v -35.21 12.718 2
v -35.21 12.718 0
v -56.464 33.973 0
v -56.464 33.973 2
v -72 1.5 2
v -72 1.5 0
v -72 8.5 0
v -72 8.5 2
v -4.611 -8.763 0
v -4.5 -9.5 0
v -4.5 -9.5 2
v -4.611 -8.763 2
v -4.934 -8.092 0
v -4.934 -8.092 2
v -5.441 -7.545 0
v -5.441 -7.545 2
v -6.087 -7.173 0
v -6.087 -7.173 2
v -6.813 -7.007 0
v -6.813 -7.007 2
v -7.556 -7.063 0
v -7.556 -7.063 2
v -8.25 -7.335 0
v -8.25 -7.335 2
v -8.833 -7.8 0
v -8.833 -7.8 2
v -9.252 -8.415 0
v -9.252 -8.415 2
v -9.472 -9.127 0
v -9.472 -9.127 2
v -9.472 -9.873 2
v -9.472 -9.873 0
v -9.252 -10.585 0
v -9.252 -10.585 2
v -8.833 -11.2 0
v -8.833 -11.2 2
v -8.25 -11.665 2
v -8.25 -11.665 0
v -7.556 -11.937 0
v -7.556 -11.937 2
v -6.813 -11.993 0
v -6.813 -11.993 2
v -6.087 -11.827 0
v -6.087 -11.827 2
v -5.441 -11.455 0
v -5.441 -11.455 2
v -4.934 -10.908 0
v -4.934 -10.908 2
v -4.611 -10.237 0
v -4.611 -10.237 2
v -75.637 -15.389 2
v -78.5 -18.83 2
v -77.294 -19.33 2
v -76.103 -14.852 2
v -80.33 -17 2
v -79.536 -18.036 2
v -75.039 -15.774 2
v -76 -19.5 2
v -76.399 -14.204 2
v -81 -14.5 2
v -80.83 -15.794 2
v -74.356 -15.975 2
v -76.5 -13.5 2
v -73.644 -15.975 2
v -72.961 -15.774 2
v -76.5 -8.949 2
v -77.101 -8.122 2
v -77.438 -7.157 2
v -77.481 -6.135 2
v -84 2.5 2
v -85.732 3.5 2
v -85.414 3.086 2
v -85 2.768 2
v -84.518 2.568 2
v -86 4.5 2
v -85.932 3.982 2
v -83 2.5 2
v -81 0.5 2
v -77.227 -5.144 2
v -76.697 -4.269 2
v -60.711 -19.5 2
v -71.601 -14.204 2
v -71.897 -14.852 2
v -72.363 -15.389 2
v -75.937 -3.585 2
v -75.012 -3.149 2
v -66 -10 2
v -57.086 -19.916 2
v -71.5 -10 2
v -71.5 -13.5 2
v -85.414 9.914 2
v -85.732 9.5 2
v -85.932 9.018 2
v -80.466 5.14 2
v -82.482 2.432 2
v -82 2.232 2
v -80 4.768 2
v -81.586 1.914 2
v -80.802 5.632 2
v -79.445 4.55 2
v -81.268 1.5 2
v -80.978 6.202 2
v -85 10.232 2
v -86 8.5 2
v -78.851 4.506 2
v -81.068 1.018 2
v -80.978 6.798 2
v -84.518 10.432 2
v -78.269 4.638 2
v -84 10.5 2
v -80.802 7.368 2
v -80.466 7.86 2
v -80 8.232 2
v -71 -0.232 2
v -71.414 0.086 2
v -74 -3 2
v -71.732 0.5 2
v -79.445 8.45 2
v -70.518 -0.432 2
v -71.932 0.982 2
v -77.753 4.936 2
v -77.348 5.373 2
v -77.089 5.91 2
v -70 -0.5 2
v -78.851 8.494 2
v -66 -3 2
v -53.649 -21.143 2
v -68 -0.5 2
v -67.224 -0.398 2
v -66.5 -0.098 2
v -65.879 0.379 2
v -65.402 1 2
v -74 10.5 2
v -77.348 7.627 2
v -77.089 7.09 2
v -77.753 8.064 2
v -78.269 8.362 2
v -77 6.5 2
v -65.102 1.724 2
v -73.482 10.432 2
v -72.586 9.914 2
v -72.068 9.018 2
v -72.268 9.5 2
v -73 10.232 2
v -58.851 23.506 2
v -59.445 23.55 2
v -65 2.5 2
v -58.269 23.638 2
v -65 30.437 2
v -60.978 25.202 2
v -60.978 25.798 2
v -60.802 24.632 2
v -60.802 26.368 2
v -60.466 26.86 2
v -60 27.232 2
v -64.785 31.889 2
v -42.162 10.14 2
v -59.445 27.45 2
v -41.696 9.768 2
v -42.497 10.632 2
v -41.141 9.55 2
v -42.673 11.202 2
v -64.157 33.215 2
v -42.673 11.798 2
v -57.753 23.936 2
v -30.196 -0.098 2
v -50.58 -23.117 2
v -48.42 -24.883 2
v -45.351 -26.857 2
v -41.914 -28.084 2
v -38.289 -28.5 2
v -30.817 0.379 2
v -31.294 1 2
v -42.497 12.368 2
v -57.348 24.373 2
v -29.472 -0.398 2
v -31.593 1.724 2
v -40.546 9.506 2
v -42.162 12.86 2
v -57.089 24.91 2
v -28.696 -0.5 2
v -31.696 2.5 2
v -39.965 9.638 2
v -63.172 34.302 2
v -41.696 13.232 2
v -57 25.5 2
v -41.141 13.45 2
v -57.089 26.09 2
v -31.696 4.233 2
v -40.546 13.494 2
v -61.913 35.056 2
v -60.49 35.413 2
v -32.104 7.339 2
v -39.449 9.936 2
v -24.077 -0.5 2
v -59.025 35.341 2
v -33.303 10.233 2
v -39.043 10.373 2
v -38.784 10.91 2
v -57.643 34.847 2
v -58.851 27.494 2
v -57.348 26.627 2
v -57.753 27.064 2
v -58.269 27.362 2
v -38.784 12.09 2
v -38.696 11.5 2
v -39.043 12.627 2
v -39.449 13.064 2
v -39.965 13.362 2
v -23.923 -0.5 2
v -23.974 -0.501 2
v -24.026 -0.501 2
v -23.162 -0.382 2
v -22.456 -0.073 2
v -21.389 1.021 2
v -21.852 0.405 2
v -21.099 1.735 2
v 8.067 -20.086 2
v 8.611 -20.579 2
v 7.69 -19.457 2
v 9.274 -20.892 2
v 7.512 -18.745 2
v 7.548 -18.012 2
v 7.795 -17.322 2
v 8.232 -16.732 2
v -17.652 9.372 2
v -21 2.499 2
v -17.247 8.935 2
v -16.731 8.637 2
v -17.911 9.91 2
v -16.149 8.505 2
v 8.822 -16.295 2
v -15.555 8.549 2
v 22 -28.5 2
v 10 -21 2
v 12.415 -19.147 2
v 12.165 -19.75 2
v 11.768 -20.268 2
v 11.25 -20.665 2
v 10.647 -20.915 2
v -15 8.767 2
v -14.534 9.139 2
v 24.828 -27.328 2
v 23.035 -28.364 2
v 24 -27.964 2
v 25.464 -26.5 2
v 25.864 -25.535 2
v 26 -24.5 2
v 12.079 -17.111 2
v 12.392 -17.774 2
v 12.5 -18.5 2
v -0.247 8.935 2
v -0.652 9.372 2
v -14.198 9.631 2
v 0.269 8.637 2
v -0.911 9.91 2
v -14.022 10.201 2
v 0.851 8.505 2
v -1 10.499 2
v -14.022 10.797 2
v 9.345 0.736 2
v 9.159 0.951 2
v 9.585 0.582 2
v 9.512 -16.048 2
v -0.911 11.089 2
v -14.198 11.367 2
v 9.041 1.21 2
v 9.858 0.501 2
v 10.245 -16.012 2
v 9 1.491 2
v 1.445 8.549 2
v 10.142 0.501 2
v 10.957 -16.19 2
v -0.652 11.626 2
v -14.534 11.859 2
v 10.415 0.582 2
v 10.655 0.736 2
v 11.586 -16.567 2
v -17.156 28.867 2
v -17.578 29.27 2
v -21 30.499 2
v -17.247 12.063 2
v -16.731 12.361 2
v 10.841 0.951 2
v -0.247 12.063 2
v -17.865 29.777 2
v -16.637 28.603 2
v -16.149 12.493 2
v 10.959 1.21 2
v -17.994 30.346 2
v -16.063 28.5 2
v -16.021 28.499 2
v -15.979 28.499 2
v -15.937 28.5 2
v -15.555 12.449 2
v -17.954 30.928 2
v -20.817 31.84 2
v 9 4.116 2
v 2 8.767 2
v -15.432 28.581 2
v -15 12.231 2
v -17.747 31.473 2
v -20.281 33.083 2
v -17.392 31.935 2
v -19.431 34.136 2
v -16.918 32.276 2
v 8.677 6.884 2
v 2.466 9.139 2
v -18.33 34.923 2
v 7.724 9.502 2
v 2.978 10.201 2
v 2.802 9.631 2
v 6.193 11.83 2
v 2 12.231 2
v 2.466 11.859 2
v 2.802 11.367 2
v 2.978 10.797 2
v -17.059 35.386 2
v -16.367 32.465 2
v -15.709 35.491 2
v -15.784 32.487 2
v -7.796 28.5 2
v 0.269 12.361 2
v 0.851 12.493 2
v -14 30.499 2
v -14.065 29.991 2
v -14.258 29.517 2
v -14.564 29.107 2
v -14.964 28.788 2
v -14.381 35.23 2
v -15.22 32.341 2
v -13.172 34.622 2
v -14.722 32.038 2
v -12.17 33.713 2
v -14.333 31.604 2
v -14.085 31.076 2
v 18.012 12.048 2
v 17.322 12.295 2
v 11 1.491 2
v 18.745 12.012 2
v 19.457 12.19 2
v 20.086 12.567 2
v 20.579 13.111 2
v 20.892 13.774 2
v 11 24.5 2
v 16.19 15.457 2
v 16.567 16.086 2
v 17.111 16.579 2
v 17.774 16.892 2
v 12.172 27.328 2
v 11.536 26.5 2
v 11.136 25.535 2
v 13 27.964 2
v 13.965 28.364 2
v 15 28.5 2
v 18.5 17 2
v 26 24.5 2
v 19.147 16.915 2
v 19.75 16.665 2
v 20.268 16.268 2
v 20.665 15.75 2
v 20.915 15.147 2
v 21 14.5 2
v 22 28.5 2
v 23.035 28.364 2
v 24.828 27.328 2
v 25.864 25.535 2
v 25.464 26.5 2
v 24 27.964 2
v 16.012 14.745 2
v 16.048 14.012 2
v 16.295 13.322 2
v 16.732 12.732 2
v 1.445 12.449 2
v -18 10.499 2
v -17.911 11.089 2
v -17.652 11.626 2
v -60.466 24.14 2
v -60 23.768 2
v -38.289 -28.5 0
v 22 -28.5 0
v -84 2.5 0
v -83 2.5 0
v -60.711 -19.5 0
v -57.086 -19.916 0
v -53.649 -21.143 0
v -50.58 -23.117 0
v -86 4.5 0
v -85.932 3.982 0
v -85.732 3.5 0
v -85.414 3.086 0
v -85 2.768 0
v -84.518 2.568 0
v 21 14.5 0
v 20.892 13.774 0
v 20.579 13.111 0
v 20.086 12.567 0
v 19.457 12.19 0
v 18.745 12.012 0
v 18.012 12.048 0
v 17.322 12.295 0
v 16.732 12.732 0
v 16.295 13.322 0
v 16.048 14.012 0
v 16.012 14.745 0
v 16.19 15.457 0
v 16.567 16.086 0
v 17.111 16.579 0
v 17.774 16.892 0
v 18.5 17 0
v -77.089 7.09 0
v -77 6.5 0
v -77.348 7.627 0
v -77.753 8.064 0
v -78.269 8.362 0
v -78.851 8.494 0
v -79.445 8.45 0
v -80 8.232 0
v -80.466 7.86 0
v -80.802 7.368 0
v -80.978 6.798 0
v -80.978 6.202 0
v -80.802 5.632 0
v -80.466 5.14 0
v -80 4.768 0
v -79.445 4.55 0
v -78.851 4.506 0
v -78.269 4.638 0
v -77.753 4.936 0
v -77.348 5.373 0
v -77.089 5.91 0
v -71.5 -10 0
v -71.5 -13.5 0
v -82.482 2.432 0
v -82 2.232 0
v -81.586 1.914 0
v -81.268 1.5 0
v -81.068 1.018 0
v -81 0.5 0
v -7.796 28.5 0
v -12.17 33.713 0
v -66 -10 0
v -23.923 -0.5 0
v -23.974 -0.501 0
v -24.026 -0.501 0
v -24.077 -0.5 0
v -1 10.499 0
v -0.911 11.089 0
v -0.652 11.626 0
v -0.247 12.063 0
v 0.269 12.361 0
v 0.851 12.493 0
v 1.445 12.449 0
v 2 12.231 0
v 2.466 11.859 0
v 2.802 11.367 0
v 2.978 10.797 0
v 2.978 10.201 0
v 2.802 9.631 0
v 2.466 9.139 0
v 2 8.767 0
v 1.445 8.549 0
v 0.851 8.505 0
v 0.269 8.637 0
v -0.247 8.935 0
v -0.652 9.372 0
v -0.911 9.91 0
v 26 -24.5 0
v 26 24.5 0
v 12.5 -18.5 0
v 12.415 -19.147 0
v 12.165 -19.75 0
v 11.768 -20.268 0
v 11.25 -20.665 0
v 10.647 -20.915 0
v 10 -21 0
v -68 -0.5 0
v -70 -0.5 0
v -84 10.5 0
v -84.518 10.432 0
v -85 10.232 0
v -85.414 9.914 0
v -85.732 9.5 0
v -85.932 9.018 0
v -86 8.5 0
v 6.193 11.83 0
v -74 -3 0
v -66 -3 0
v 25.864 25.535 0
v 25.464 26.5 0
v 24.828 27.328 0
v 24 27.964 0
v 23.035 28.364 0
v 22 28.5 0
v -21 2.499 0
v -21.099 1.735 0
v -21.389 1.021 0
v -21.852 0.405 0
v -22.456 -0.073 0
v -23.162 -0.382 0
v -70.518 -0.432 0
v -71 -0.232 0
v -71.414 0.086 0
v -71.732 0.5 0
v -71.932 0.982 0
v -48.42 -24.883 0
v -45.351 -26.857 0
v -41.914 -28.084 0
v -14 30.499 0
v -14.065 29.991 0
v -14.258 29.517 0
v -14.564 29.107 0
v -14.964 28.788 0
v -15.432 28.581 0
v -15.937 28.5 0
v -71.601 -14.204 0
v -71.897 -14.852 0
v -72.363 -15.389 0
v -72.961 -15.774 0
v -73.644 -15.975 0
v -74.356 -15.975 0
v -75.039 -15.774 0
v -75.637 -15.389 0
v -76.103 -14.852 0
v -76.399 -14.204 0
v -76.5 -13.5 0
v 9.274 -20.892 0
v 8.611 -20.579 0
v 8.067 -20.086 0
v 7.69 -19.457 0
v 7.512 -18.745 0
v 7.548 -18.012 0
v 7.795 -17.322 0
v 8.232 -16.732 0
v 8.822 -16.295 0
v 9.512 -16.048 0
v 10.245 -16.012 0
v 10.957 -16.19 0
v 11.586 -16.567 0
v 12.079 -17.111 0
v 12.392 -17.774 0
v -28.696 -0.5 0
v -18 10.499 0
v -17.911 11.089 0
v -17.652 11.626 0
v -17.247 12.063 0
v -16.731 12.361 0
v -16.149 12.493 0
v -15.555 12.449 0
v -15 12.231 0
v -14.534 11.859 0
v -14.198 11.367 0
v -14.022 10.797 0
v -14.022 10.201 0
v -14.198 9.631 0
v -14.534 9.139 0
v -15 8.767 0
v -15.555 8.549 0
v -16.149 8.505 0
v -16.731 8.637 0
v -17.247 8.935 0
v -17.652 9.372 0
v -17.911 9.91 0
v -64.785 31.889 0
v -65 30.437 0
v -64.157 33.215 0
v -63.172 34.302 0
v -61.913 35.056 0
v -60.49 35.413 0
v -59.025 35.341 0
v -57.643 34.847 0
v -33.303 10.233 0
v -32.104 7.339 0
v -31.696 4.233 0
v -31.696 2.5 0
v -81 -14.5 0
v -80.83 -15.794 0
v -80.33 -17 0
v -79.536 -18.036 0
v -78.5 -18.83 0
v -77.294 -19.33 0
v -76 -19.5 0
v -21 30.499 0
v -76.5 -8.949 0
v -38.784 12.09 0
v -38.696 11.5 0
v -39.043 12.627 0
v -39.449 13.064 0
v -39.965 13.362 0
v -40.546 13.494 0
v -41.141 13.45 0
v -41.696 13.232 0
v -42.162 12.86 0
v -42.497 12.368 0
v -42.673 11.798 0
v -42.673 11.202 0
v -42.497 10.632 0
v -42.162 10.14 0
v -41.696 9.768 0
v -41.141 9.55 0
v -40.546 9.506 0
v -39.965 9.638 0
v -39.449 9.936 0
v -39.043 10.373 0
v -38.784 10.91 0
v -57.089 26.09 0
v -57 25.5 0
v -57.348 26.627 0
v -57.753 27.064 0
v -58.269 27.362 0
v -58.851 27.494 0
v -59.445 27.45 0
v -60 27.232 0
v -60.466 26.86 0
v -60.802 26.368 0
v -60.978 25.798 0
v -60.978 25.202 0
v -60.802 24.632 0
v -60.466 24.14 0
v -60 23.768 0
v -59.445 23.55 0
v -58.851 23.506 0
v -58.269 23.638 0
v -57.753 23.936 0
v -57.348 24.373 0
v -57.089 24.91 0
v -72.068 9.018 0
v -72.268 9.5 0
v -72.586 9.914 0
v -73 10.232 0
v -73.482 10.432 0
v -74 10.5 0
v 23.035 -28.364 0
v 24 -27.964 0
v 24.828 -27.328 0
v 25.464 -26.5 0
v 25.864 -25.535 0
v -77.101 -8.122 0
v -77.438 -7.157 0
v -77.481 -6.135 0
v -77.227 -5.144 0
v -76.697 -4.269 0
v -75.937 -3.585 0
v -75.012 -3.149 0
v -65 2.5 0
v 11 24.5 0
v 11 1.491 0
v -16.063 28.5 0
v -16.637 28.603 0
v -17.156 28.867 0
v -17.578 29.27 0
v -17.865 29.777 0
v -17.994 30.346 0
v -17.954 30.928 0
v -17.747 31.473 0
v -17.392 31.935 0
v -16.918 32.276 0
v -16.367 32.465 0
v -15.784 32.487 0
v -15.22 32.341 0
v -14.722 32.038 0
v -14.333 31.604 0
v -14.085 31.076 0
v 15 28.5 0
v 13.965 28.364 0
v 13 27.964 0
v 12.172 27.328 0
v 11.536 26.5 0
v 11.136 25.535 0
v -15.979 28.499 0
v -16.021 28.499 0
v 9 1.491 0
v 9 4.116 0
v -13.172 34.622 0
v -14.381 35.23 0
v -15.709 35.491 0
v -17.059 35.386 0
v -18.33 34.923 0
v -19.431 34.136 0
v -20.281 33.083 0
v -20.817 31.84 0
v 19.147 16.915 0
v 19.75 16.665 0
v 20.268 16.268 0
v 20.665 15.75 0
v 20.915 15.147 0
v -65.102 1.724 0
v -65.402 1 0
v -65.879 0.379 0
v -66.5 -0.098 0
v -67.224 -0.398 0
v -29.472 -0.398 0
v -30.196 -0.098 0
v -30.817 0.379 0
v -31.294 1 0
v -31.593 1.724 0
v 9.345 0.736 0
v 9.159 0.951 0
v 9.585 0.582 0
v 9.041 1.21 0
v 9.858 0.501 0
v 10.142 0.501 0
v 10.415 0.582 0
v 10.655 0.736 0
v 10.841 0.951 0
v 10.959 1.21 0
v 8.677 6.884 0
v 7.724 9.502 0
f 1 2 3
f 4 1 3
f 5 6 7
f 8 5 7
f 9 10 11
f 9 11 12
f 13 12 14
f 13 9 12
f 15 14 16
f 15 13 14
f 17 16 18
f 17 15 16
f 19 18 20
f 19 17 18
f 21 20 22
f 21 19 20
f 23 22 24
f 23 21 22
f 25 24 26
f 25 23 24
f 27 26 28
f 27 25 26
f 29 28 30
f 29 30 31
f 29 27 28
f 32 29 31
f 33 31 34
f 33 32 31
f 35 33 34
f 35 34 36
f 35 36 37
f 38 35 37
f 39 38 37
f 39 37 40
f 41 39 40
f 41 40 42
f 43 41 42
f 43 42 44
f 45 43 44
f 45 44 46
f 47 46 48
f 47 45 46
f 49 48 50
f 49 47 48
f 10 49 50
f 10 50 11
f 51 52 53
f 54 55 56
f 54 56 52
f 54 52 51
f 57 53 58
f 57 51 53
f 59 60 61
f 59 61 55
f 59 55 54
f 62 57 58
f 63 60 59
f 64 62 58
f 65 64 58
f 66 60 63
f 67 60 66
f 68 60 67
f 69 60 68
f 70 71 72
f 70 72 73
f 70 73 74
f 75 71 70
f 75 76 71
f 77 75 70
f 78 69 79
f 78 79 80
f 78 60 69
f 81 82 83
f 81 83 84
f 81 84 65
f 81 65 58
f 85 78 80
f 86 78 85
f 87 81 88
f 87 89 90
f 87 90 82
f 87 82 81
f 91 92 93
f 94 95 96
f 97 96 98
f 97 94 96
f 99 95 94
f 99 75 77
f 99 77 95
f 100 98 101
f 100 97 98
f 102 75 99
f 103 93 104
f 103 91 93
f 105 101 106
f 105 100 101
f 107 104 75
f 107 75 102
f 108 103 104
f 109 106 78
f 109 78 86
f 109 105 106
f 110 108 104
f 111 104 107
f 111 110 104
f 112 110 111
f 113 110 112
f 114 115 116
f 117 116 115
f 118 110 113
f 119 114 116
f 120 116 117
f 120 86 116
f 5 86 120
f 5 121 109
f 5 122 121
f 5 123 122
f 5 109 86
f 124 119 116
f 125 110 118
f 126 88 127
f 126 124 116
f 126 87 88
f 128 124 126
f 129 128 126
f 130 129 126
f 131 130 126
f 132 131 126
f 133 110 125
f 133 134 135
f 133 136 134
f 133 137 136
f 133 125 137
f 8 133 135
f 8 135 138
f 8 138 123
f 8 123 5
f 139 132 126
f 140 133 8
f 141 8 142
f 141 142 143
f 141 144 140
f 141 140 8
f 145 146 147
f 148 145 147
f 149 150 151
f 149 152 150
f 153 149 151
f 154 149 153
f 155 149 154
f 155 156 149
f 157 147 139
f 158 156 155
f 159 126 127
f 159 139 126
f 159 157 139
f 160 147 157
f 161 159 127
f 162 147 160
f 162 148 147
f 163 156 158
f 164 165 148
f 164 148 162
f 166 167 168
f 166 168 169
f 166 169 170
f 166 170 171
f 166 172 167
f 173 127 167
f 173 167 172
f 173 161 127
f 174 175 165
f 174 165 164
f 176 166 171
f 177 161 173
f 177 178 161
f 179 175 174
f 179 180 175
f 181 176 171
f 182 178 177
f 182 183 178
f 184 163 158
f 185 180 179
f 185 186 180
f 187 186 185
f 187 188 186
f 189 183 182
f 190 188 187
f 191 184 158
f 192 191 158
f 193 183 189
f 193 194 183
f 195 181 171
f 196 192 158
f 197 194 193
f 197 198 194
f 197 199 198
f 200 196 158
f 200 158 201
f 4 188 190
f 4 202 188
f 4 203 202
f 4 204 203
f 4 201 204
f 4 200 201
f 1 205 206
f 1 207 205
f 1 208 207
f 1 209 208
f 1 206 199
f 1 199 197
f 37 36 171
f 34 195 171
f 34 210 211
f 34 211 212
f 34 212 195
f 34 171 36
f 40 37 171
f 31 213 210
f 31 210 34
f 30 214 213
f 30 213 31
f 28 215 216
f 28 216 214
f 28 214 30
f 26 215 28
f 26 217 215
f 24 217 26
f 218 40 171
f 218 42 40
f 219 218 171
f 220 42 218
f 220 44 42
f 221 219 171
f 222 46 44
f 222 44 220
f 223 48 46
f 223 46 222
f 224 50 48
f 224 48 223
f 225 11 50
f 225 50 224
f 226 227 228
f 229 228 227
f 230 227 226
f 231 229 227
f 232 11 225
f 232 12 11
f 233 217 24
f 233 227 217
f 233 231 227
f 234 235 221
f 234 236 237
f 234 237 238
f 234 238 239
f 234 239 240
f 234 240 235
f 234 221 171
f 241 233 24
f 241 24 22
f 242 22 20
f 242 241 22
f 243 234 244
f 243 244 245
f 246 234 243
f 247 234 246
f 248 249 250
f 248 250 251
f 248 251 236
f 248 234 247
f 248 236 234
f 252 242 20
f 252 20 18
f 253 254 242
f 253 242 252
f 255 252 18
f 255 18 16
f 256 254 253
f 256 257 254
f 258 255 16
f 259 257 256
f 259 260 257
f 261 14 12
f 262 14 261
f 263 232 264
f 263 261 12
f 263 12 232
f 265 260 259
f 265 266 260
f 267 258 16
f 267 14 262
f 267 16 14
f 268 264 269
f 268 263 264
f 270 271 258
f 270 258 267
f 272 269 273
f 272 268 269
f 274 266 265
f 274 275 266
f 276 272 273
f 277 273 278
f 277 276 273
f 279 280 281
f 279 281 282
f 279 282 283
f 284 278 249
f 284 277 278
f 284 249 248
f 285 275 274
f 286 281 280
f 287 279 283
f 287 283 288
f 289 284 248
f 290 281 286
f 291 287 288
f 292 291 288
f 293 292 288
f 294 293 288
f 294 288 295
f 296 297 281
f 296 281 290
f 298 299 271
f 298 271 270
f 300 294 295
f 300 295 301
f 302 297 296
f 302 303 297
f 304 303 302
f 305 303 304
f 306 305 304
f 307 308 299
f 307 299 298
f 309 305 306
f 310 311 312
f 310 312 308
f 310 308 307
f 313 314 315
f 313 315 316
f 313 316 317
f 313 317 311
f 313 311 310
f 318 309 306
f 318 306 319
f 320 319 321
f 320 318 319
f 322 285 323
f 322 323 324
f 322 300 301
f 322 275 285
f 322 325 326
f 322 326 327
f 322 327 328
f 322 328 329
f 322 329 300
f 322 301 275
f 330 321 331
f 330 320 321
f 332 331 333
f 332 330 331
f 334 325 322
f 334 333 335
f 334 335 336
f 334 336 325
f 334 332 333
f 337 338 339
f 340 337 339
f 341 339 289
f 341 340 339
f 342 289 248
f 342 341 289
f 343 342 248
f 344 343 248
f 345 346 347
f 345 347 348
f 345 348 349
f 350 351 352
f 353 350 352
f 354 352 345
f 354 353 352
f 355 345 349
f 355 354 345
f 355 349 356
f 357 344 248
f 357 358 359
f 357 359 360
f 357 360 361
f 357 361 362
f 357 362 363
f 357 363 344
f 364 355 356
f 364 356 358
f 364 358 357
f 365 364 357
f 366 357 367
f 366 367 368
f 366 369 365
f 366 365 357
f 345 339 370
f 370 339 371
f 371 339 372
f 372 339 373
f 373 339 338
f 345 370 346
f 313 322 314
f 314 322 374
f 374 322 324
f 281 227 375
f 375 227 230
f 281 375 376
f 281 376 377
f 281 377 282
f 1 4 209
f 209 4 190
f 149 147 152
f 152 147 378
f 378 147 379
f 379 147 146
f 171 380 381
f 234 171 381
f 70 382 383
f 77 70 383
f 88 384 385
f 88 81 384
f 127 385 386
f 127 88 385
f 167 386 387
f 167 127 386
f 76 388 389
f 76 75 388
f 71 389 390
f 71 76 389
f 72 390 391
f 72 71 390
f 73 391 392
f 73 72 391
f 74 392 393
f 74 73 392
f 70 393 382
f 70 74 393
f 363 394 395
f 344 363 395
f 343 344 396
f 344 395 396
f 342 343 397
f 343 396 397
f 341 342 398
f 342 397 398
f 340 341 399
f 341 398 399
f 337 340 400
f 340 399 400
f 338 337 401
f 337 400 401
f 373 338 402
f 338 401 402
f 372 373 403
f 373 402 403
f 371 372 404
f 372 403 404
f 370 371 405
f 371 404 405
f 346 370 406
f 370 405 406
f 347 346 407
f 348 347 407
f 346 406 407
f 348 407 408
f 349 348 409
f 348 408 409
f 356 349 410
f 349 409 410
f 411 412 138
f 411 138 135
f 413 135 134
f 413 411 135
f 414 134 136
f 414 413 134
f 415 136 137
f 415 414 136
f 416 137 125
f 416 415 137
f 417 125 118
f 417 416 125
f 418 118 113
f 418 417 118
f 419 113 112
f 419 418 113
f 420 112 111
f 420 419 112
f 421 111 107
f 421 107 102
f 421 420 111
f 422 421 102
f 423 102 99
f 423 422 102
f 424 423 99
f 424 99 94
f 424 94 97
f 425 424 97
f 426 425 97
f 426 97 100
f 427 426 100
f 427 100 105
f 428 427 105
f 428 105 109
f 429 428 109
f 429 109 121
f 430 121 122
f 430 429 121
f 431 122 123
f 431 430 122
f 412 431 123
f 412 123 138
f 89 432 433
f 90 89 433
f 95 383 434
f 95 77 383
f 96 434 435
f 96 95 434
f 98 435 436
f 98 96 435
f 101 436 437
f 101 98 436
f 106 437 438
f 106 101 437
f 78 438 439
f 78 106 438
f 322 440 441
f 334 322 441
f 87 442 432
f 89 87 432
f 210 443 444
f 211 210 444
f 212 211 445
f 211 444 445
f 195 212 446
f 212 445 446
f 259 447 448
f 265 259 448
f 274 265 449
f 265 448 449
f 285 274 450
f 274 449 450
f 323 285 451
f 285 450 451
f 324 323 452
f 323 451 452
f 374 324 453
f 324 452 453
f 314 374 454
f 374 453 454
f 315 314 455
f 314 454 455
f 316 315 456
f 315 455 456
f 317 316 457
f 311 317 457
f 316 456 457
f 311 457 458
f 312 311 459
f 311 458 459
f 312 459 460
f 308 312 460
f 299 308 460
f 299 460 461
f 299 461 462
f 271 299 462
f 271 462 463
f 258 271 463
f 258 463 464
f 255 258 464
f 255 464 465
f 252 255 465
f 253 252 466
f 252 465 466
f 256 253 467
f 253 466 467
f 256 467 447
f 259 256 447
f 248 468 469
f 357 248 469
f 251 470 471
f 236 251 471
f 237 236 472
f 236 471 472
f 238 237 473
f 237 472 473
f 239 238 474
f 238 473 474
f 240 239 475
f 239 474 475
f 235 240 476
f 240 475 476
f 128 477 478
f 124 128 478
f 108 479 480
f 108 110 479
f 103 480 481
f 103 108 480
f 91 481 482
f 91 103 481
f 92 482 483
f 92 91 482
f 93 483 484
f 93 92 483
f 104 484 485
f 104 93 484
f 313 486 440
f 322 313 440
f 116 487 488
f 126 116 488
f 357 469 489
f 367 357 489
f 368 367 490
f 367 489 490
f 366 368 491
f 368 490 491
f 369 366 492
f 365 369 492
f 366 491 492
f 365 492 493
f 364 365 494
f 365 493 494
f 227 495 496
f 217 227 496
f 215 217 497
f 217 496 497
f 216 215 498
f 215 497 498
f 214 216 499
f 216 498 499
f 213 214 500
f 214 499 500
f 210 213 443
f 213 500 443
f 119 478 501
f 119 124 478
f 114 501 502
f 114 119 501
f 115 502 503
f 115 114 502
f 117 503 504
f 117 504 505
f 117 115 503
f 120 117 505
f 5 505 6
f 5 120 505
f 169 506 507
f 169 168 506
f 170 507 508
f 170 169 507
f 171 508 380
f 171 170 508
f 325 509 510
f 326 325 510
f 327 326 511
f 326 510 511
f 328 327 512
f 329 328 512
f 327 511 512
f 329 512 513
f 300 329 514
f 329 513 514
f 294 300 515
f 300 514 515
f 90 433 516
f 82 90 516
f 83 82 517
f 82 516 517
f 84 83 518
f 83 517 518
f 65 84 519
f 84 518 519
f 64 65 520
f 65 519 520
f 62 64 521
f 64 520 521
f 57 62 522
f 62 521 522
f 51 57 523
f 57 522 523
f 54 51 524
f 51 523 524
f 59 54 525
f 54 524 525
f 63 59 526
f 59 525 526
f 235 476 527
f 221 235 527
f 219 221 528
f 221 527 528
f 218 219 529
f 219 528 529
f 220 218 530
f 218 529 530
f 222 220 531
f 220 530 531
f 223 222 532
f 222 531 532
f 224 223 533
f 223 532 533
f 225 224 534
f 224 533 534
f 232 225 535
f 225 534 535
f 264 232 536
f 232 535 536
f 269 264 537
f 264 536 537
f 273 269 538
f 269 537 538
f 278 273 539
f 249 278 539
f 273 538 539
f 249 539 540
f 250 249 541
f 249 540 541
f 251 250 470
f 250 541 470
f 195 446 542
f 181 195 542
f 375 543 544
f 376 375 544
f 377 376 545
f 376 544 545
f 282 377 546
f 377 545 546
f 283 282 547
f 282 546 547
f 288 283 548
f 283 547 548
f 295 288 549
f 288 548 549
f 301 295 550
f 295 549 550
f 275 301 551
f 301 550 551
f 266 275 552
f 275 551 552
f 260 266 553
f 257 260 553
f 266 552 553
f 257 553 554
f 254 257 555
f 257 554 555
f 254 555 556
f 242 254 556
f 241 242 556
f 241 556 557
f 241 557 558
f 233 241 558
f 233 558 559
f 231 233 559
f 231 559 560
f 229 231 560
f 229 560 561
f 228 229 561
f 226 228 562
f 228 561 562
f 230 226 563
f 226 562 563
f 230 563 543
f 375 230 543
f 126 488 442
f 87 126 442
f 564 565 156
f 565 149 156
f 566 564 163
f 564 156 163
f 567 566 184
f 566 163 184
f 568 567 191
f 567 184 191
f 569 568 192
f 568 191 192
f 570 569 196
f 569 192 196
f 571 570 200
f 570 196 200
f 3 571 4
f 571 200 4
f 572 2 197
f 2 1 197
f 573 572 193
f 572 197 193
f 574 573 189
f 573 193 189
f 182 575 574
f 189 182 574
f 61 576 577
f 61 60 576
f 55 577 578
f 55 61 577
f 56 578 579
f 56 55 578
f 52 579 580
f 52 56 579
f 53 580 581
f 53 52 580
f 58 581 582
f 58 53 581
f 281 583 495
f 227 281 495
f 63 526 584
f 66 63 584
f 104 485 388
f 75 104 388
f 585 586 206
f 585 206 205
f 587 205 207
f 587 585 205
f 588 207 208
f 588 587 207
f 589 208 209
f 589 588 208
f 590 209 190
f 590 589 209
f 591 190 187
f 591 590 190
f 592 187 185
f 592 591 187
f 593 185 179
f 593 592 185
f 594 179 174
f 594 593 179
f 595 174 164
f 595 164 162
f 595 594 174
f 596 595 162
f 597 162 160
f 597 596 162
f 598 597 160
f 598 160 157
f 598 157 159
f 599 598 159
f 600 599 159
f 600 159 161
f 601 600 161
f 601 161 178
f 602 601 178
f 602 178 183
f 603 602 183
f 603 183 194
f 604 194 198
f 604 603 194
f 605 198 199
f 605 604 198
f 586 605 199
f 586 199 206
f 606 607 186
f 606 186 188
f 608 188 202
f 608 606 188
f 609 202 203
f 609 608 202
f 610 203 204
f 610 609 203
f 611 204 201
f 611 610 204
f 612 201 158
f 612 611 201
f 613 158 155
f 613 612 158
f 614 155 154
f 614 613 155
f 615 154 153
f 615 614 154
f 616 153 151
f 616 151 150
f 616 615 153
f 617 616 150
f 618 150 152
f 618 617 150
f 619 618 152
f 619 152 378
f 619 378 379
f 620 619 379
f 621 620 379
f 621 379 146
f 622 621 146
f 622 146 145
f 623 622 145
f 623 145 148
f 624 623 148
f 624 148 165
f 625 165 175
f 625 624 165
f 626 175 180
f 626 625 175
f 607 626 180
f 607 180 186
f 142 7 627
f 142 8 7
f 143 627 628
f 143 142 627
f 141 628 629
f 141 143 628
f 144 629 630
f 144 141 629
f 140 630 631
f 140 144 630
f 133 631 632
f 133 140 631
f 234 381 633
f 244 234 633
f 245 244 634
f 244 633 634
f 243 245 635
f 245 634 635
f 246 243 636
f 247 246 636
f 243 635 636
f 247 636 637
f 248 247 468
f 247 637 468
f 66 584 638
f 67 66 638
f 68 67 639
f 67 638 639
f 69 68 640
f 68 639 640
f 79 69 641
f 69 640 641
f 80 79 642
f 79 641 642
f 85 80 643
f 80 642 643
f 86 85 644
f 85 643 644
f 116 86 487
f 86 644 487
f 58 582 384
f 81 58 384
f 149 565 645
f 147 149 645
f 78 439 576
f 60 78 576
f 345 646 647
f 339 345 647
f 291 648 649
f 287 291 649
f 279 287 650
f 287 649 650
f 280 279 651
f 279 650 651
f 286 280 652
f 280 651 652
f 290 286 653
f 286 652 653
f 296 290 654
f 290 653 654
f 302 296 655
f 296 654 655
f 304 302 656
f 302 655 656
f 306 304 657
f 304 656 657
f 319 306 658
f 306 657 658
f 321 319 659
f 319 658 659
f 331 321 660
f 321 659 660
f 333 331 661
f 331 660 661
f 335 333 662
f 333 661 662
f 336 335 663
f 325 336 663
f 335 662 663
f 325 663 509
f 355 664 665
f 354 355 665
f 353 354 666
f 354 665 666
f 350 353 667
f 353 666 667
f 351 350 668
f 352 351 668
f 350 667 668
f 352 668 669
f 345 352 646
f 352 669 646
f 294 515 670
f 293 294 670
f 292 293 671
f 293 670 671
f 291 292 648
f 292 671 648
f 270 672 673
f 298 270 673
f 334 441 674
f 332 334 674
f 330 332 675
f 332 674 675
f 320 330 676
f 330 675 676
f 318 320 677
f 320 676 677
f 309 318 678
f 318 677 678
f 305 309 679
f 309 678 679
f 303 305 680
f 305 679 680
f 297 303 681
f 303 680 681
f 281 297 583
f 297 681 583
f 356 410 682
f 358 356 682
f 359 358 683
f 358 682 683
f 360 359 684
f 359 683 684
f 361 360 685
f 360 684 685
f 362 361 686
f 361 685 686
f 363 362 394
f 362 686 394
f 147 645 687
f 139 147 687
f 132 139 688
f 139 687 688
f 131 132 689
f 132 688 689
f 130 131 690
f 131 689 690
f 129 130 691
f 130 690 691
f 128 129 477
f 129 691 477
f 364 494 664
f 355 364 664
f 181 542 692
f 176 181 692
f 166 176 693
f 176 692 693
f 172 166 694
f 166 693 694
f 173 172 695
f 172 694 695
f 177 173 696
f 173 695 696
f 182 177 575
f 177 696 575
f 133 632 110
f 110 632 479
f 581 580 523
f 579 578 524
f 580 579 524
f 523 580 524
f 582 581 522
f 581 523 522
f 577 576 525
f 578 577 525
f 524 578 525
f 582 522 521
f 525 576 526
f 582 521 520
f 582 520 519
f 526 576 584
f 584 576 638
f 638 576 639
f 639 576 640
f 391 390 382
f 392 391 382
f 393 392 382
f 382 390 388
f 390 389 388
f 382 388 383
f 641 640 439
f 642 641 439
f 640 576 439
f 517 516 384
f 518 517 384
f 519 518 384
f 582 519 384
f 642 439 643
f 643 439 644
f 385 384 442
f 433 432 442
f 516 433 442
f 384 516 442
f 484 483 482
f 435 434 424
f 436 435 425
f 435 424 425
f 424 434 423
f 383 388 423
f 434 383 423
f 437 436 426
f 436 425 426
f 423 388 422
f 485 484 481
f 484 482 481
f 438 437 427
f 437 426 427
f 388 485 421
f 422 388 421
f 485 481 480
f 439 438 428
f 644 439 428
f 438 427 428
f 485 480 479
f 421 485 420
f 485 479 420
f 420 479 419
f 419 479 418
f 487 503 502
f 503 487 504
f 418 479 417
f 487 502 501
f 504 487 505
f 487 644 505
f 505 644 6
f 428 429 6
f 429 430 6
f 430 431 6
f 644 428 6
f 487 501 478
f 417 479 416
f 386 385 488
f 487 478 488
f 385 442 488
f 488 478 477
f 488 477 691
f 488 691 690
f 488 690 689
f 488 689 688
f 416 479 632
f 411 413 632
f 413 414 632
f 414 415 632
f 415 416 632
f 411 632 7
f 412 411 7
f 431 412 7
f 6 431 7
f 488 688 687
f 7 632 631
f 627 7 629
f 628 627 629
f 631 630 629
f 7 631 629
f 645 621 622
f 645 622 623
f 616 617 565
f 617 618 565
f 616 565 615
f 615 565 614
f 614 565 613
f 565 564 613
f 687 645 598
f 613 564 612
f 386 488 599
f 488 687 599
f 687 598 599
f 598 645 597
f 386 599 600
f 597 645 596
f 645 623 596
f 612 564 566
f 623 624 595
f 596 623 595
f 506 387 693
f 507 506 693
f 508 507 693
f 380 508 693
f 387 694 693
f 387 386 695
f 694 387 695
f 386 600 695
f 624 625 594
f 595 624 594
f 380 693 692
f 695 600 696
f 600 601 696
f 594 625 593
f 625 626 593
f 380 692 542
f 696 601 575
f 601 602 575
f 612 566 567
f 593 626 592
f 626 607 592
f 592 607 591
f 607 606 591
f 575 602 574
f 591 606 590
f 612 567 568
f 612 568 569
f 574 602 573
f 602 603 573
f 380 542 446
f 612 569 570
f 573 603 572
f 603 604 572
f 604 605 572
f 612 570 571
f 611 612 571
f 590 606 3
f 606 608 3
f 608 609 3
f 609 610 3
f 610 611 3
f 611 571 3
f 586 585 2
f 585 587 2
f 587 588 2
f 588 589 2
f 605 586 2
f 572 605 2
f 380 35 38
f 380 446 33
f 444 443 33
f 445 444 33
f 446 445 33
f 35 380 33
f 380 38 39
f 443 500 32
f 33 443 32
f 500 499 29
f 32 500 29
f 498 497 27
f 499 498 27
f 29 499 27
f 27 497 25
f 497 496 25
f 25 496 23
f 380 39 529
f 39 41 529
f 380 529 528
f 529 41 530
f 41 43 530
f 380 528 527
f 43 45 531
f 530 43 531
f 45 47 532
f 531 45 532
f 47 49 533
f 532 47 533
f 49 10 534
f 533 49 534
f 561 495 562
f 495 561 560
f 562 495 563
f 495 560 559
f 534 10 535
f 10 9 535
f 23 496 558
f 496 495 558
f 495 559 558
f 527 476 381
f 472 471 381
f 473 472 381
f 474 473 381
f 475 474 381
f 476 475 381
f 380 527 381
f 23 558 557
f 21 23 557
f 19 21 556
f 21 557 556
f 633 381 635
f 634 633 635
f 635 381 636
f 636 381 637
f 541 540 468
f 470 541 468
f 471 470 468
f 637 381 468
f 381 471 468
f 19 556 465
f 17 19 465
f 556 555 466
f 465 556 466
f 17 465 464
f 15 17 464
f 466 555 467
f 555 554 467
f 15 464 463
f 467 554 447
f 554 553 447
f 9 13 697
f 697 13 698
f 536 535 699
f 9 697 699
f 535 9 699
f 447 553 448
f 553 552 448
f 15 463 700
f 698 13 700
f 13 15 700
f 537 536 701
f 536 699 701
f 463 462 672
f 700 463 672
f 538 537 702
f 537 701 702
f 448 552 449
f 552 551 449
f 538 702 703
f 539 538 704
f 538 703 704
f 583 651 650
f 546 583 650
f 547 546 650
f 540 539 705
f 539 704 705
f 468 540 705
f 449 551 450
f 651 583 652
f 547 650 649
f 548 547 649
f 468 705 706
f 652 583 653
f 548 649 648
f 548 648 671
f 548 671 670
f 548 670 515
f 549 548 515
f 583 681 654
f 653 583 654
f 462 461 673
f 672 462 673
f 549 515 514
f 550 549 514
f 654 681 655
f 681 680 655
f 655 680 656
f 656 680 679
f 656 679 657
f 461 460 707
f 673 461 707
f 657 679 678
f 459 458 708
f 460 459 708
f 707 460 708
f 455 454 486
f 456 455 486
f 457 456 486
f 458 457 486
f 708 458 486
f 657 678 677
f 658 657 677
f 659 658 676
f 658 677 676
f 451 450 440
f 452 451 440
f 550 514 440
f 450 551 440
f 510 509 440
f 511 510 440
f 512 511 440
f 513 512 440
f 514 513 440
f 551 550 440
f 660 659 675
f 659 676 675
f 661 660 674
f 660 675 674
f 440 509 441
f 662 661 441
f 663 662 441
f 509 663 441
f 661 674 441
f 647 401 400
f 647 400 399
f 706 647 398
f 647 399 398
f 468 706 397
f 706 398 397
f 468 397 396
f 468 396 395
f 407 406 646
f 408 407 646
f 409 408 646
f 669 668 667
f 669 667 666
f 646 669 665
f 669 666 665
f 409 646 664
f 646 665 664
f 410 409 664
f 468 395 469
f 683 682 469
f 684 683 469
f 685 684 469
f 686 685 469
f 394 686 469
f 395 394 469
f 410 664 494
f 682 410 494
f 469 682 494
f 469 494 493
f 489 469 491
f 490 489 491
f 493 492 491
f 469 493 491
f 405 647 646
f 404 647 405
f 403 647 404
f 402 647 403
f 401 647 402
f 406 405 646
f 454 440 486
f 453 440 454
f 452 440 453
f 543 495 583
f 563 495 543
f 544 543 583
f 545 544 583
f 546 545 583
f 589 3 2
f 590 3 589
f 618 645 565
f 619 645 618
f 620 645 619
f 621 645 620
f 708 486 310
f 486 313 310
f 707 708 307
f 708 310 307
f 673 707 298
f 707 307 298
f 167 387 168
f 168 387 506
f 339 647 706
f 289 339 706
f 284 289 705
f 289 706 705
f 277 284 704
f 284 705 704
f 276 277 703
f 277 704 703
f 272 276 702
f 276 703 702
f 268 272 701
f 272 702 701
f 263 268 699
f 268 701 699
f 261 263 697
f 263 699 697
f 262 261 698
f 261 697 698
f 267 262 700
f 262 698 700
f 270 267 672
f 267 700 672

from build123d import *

# Parameters (mm, degrees)
F0_R     = 2
F0_R_2   = 2.5
F1_DEPTH = 2
F2_R     = 2
F3_R     = 5
F4_R     = 12
F5_R     = 5
F6_R     = 16


with BuildPart() as f1:
    # F0 (on Top) → F1 (new body)
    with BuildSketch(Plane.XY):
        Polygon((-40.6955056692, 2.5), (-31.6955056692, 2.5), (-31.6955056692, 9.2036510807), (-65, 42.5081454115), (-65, 34.5), (-65, 2.5), align=None)
        with Locations((-40.6955056692, 11.5)):
            Circle(F0_R, mode=Mode.SUBTRACT)
        with Locations((-59, 25.5)):
            Circle(F0_R, mode=Mode.SUBTRACT)
        with BuildLine():
            Line((-44, -28.5), (-26, -28.5))
            Line((-26, -28.5), (-26, -0.5))
            Line((-26, -0.5), (-28.6955056692, -0.5))
            ThreePointArc((-28.6955056692, -0.5), (-30.8168260127, 0.3786796564), (-31.6955056692, 2.5))
            Line((-31.6955056692, 2.5), (-40.6955056692, 2.5))
            Line((-40.6955056692, 2.5), (-65, 2.5))
            ThreePointArc((-65, 2.5), (-65.8786796564, 0.3786796564), (-68, -0.5))
            Line((-68, -0.5), (-68, -3))
            Line((-68, -3), (-66, -3))
            Line((-66, -3), (-66, -10))
            Line((-66, -10), (-68, -10))
            Line((-68, -10), (-68, -19.5))
            Line((-68, -19.5), (-55, -19.5))
            Line((-55, -19.5), (-44, -28.5))
        make_face()
        Polygon((-74, -3), (-68, -3), (-68, -0.5), (-72, -0.5), (-74, -0.5), align=None)
        with BuildLine():
            Line((-81, -19.5), (-68, -19.5))
            Line((-68, -19.5), (-68, -10))
            Line((-68, -10), (-71.5, -10))
            Line((-71.5, -10), (-71.5, -13.5))
            ThreePointArc((-71.5, -13.5), (-74, -16), (-76.5, -13.5))
            Line((-76.5, -13.5), (-76.5, -8.9494897428))
            ThreePointArc((-76.5, -8.9494897428), (-77.2267021942, -5.1441264992), (-74, -3))
            Line((-74, -3), (-74, -0.5))
            Line((-74, -0.5), (-81, -0.5))
            Line((-81, -0.5), (-81, -19.5))
        make_face()
        Polygon((-81, 2.5), (-81, -0.5), (-74, -0.5), (-72, -0.5), (-72, 10.5), (-86, 10.5), (-86, 2.5), align=None)
        with Locations((-79, 6.5)):
            Circle(F0_R, mode=Mode.SUBTRACT)
        with BuildLine():
            ThreePointArc((26, 24.5), (24.8284271247, 27.3284271247), (22, 28.5))
            Line((22, 28.5), (18.5, 28.5))
            Line((18.5, 28.5), (15, 28.5))
            ThreePointArc((15, 28.5), (12.1715728753, 27.3284271247), (11, 24.5))
            Line((11, 24.5), (11, 2.5))
            Line((11, 2.5), (11, 1.4913195046))
            ThreePointArc((11, 1.4913195046), (10, 0.4913195046), (9, 1.4913195046))
            Line((9, 1.4913195046), (9, 2.4990135962))
            Line((9, 2.4990135962), (9, 8.4837929157))
            Line((9, 8.4837929157), (-7.795591982, 28.5))
            Line((-7.795591982, 28.5), (-15.9371936145, 28.5))
            ThreePointArc((-15.9371936145, 28.5), (-16, 28.4990135962), (-16.0628063855, 28.5))
            Line((-16.0628063855, 28.5), (-21, 28.5))
            Line((-21, 28.5), (-21, 10.4990135962))
            Line((-21, 10.4990135962), (-21, 2.4990135962))
            ThreePointArc((-21, 2.4990135962), (-21.8516547202, 0.4050669496), (-23.9230750393, -0.5))
            ThreePointArc((-23.9230750393, -0.5), (-24, -0.5009864038), (-24.0769249607, -0.5))
            Line((-24.0769249607, -0.5), (-26, -0.5))
            Line((-26, -0.5), (-26, -28.5))
            Line((-26, -28.5), (-7, -28.5))
            Line((-7, -28.5), (9, -28.5))
            Line((9, -28.5), (10, -28.5))
            Line((10, -28.5), (11, -28.5))
            Line((11, -28.5), (22, -28.5))
            ThreePointArc((22, -28.5), (24.8284271247, -27.3284271247), (26, -24.5))
            Line((26, -24.5), (26, 24.5))
        make_face()
        with BuildLine():
            ThreePointArc((12.5, -18.5), (11.767766953, -20.267766953), (10, -21))
            ThreePointArc((10, -21), (8.232233047, -16.732233047), (12.5, -18.5))
        make_face(mode=Mode.SUBTRACT)
        with Locations((-7, -9.5)):
            Circle(F0_R_2, mode=Mode.SUBTRACT)
        with BuildLine():
            ThreePointArc((-14, 10.4990135962), (-16, 8.4990135962), (-18, 10.4990135962))
            ThreePointArc((-18, 10.4990135962), (-16, 12.4990135962), (-14, 10.4990135962))
        make_face(mode=Mode.SUBTRACT)
        with BuildLine():
            ThreePointArc((3, 10.4990135962), (1, 8.4990135962), (-1, 10.4990135962))
            ThreePointArc((-1, 10.4990135962), (1, 12.4990135962), (3, 10.4990135962))
        make_face(mode=Mode.SUBTRACT)
        with BuildLine():
            ThreePointArc((21, 14.5), (16.732233047, 12.732233047), (18.5, 17))
            ThreePointArc((18.5, 17), (20.267766953, 16.267766953), (21, 14.5))
        make_face(mode=Mode.SUBTRACT)
        with BuildLine():
            Line((-15.9371936145, 28.5), (-7.795591982, 28.5))
            Line((-7.795591982, 28.5), (-12.1697777844, 33.7129516447))
            ThreePointArc((-12.1697777844, 33.7129516447), (-17.7101007166, 35.1974767002), (-21, 30.4990135962))
            Line((-21, 30.4990135962), (-21, 28.5))
            Line((-21, 28.5), (-16.0628063855, 28.5))
            ThreePointArc((-16.0628063855, 28.5), (-17.3918310294, 31.9352609236), (-14, 30.4990135962))
            ThreePointArc((-14, 30.4990135962), (-14.5637526726, 29.1071825668), (-15.9371936145, 28.5))
        make_face()
    extrude(amount=F1_DEPTH)

    # F2
    f2_edges = [f1.edges().sort_by_distance(p)[0] for p in [
        (-72, 10.5, 1),
        (-86, 10.5, 1),
        (-86, 2.5, 1),
        (-81, 2.5, 1),
        (-72, -0.5, 1),
    ]]
    fillet(f2_edges, radius=F2_R)

    # F3
    f3_edges = [f1.edges().sort_by_distance(p)[0] for p in [
        (-65, 42.508145, 1),
    ]]
    fillet(f3_edges, radius=F3_R)

    # F4
    f4_edges = [f1.edges().sort_by_distance(p)[0] for p in [
        (-31.695506, 9.203651, 1),
        (9, 8.483793, 1),
    ]]
    fillet(f4_edges, radius=F4_R)

    # F5
    f5_edges = [f1.edges().sort_by_distance(p)[0] for p in [
        (-81, -19.5, 1),
    ]]
    fillet(f5_edges, radius=F5_R)

    # F6
    f6_edges = [f1.edges().sort_by_distance(p)[0] for p in [
        (-55, -19.5, 1),
        (-44, -28.5, 1),
    ]]
    fillet(f6_edges, radius=F6_R)


solid = f1.part
